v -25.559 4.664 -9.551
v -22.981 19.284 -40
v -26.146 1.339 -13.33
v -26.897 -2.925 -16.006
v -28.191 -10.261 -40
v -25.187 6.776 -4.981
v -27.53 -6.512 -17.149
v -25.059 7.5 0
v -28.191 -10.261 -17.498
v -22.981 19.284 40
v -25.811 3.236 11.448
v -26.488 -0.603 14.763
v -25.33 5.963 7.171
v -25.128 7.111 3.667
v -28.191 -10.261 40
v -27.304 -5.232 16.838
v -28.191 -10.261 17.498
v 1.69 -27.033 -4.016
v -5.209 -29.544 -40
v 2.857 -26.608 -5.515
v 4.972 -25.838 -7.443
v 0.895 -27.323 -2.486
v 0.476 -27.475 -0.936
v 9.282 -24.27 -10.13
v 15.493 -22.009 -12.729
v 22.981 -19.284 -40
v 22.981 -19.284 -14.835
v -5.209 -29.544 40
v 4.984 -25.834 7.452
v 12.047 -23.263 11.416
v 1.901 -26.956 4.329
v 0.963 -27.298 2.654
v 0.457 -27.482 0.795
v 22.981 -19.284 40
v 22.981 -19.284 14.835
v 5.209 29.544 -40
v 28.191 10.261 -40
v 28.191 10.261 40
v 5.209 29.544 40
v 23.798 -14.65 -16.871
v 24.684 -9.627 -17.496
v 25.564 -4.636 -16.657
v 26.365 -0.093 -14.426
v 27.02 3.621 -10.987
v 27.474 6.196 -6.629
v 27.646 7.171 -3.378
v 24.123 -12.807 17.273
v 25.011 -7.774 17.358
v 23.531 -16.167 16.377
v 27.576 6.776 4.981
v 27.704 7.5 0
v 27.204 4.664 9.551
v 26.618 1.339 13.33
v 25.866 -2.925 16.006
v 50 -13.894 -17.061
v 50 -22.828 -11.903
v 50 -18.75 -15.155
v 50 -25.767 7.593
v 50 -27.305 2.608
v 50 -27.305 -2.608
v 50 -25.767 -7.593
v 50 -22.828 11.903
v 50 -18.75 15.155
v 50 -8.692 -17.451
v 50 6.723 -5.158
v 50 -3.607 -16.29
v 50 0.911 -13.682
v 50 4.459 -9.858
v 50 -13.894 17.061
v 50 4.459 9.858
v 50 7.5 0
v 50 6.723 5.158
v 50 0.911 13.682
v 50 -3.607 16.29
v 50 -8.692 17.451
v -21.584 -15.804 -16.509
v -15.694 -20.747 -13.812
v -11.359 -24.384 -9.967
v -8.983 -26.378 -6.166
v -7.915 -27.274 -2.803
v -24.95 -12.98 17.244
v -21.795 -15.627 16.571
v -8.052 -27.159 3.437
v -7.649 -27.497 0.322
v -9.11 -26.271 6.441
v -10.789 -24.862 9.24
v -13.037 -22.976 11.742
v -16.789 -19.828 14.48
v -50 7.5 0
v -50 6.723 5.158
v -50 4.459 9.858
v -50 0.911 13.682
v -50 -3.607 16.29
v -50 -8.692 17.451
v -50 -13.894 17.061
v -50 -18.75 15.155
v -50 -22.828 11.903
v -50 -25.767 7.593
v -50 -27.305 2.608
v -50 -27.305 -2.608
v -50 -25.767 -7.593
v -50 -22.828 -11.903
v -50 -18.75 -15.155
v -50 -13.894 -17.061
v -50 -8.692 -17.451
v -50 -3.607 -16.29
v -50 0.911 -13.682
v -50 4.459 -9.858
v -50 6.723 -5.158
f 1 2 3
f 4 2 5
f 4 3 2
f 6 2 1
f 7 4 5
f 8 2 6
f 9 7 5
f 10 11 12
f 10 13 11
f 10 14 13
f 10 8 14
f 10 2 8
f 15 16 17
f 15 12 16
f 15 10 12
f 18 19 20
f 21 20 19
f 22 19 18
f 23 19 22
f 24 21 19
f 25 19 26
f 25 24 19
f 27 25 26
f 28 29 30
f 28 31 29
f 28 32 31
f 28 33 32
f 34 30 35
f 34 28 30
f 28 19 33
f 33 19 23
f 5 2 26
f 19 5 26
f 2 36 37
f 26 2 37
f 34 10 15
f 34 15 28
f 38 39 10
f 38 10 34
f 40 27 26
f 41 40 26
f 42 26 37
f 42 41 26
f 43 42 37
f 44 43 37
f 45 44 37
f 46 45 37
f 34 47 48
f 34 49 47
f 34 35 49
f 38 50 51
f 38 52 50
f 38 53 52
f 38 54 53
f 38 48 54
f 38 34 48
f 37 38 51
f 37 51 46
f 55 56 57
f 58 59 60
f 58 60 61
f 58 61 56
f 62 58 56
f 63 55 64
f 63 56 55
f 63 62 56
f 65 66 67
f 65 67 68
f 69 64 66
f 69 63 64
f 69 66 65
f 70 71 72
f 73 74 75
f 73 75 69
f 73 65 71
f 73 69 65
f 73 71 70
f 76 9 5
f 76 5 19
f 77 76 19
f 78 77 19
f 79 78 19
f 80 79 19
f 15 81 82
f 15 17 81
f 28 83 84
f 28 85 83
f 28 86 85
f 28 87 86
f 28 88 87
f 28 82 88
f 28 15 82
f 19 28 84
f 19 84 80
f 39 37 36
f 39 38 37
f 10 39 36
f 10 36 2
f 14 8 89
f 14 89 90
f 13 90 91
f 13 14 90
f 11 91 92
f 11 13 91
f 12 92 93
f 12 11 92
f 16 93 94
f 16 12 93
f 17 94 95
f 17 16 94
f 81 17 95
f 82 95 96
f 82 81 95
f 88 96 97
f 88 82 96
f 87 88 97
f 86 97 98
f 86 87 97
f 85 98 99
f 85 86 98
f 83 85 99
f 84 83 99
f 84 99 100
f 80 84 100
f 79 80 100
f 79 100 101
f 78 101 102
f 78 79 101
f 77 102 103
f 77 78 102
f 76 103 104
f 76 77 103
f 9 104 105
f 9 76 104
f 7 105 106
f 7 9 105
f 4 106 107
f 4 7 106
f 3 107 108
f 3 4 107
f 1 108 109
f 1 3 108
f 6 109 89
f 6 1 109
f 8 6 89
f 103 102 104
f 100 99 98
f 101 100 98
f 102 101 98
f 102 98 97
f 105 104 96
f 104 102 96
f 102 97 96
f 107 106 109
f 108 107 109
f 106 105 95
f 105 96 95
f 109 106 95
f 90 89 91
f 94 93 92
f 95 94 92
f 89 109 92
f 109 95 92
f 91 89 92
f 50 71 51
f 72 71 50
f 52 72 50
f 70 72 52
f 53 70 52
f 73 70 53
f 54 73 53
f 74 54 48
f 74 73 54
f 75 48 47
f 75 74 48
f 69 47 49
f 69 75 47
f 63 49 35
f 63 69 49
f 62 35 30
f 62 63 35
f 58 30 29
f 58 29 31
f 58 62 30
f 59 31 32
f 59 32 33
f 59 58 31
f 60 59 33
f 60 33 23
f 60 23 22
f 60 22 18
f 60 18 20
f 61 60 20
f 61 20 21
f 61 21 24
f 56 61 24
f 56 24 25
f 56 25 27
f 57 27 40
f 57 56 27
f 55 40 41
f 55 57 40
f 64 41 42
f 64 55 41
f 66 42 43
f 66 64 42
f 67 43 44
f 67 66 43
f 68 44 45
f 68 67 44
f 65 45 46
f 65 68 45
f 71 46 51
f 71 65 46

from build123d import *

# Parameters (mm, degrees)
F1_DEPTH = 40
F2_R     = 17.5
F3_DEPTH = 50


with BuildPart() as f1:
    # F0 (on Top) → F1 (new body, symmetric)
    with BuildSketch(Plane.XY):
        Polygon((28.1907786236, 10.2606042998), (5.20944533, 29.5442325904), (-22.9813332936, 19.2836282906), (-28.1907786236, -10.2606042998), (-5.20944533, -29.5442325904), (22.9813332936, -19.2836282906), align=None)
    extrude(amount=F1_DEPTH, both=True)

    # F2 (on Right) → F3 (join, symmetric)
    with BuildSketch(Plane.YZ):
        with Locations((-10, 0)):
            Circle(F2_R)
    extrude(amount=F3_DEPTH, both=True)


solid = f1.part
